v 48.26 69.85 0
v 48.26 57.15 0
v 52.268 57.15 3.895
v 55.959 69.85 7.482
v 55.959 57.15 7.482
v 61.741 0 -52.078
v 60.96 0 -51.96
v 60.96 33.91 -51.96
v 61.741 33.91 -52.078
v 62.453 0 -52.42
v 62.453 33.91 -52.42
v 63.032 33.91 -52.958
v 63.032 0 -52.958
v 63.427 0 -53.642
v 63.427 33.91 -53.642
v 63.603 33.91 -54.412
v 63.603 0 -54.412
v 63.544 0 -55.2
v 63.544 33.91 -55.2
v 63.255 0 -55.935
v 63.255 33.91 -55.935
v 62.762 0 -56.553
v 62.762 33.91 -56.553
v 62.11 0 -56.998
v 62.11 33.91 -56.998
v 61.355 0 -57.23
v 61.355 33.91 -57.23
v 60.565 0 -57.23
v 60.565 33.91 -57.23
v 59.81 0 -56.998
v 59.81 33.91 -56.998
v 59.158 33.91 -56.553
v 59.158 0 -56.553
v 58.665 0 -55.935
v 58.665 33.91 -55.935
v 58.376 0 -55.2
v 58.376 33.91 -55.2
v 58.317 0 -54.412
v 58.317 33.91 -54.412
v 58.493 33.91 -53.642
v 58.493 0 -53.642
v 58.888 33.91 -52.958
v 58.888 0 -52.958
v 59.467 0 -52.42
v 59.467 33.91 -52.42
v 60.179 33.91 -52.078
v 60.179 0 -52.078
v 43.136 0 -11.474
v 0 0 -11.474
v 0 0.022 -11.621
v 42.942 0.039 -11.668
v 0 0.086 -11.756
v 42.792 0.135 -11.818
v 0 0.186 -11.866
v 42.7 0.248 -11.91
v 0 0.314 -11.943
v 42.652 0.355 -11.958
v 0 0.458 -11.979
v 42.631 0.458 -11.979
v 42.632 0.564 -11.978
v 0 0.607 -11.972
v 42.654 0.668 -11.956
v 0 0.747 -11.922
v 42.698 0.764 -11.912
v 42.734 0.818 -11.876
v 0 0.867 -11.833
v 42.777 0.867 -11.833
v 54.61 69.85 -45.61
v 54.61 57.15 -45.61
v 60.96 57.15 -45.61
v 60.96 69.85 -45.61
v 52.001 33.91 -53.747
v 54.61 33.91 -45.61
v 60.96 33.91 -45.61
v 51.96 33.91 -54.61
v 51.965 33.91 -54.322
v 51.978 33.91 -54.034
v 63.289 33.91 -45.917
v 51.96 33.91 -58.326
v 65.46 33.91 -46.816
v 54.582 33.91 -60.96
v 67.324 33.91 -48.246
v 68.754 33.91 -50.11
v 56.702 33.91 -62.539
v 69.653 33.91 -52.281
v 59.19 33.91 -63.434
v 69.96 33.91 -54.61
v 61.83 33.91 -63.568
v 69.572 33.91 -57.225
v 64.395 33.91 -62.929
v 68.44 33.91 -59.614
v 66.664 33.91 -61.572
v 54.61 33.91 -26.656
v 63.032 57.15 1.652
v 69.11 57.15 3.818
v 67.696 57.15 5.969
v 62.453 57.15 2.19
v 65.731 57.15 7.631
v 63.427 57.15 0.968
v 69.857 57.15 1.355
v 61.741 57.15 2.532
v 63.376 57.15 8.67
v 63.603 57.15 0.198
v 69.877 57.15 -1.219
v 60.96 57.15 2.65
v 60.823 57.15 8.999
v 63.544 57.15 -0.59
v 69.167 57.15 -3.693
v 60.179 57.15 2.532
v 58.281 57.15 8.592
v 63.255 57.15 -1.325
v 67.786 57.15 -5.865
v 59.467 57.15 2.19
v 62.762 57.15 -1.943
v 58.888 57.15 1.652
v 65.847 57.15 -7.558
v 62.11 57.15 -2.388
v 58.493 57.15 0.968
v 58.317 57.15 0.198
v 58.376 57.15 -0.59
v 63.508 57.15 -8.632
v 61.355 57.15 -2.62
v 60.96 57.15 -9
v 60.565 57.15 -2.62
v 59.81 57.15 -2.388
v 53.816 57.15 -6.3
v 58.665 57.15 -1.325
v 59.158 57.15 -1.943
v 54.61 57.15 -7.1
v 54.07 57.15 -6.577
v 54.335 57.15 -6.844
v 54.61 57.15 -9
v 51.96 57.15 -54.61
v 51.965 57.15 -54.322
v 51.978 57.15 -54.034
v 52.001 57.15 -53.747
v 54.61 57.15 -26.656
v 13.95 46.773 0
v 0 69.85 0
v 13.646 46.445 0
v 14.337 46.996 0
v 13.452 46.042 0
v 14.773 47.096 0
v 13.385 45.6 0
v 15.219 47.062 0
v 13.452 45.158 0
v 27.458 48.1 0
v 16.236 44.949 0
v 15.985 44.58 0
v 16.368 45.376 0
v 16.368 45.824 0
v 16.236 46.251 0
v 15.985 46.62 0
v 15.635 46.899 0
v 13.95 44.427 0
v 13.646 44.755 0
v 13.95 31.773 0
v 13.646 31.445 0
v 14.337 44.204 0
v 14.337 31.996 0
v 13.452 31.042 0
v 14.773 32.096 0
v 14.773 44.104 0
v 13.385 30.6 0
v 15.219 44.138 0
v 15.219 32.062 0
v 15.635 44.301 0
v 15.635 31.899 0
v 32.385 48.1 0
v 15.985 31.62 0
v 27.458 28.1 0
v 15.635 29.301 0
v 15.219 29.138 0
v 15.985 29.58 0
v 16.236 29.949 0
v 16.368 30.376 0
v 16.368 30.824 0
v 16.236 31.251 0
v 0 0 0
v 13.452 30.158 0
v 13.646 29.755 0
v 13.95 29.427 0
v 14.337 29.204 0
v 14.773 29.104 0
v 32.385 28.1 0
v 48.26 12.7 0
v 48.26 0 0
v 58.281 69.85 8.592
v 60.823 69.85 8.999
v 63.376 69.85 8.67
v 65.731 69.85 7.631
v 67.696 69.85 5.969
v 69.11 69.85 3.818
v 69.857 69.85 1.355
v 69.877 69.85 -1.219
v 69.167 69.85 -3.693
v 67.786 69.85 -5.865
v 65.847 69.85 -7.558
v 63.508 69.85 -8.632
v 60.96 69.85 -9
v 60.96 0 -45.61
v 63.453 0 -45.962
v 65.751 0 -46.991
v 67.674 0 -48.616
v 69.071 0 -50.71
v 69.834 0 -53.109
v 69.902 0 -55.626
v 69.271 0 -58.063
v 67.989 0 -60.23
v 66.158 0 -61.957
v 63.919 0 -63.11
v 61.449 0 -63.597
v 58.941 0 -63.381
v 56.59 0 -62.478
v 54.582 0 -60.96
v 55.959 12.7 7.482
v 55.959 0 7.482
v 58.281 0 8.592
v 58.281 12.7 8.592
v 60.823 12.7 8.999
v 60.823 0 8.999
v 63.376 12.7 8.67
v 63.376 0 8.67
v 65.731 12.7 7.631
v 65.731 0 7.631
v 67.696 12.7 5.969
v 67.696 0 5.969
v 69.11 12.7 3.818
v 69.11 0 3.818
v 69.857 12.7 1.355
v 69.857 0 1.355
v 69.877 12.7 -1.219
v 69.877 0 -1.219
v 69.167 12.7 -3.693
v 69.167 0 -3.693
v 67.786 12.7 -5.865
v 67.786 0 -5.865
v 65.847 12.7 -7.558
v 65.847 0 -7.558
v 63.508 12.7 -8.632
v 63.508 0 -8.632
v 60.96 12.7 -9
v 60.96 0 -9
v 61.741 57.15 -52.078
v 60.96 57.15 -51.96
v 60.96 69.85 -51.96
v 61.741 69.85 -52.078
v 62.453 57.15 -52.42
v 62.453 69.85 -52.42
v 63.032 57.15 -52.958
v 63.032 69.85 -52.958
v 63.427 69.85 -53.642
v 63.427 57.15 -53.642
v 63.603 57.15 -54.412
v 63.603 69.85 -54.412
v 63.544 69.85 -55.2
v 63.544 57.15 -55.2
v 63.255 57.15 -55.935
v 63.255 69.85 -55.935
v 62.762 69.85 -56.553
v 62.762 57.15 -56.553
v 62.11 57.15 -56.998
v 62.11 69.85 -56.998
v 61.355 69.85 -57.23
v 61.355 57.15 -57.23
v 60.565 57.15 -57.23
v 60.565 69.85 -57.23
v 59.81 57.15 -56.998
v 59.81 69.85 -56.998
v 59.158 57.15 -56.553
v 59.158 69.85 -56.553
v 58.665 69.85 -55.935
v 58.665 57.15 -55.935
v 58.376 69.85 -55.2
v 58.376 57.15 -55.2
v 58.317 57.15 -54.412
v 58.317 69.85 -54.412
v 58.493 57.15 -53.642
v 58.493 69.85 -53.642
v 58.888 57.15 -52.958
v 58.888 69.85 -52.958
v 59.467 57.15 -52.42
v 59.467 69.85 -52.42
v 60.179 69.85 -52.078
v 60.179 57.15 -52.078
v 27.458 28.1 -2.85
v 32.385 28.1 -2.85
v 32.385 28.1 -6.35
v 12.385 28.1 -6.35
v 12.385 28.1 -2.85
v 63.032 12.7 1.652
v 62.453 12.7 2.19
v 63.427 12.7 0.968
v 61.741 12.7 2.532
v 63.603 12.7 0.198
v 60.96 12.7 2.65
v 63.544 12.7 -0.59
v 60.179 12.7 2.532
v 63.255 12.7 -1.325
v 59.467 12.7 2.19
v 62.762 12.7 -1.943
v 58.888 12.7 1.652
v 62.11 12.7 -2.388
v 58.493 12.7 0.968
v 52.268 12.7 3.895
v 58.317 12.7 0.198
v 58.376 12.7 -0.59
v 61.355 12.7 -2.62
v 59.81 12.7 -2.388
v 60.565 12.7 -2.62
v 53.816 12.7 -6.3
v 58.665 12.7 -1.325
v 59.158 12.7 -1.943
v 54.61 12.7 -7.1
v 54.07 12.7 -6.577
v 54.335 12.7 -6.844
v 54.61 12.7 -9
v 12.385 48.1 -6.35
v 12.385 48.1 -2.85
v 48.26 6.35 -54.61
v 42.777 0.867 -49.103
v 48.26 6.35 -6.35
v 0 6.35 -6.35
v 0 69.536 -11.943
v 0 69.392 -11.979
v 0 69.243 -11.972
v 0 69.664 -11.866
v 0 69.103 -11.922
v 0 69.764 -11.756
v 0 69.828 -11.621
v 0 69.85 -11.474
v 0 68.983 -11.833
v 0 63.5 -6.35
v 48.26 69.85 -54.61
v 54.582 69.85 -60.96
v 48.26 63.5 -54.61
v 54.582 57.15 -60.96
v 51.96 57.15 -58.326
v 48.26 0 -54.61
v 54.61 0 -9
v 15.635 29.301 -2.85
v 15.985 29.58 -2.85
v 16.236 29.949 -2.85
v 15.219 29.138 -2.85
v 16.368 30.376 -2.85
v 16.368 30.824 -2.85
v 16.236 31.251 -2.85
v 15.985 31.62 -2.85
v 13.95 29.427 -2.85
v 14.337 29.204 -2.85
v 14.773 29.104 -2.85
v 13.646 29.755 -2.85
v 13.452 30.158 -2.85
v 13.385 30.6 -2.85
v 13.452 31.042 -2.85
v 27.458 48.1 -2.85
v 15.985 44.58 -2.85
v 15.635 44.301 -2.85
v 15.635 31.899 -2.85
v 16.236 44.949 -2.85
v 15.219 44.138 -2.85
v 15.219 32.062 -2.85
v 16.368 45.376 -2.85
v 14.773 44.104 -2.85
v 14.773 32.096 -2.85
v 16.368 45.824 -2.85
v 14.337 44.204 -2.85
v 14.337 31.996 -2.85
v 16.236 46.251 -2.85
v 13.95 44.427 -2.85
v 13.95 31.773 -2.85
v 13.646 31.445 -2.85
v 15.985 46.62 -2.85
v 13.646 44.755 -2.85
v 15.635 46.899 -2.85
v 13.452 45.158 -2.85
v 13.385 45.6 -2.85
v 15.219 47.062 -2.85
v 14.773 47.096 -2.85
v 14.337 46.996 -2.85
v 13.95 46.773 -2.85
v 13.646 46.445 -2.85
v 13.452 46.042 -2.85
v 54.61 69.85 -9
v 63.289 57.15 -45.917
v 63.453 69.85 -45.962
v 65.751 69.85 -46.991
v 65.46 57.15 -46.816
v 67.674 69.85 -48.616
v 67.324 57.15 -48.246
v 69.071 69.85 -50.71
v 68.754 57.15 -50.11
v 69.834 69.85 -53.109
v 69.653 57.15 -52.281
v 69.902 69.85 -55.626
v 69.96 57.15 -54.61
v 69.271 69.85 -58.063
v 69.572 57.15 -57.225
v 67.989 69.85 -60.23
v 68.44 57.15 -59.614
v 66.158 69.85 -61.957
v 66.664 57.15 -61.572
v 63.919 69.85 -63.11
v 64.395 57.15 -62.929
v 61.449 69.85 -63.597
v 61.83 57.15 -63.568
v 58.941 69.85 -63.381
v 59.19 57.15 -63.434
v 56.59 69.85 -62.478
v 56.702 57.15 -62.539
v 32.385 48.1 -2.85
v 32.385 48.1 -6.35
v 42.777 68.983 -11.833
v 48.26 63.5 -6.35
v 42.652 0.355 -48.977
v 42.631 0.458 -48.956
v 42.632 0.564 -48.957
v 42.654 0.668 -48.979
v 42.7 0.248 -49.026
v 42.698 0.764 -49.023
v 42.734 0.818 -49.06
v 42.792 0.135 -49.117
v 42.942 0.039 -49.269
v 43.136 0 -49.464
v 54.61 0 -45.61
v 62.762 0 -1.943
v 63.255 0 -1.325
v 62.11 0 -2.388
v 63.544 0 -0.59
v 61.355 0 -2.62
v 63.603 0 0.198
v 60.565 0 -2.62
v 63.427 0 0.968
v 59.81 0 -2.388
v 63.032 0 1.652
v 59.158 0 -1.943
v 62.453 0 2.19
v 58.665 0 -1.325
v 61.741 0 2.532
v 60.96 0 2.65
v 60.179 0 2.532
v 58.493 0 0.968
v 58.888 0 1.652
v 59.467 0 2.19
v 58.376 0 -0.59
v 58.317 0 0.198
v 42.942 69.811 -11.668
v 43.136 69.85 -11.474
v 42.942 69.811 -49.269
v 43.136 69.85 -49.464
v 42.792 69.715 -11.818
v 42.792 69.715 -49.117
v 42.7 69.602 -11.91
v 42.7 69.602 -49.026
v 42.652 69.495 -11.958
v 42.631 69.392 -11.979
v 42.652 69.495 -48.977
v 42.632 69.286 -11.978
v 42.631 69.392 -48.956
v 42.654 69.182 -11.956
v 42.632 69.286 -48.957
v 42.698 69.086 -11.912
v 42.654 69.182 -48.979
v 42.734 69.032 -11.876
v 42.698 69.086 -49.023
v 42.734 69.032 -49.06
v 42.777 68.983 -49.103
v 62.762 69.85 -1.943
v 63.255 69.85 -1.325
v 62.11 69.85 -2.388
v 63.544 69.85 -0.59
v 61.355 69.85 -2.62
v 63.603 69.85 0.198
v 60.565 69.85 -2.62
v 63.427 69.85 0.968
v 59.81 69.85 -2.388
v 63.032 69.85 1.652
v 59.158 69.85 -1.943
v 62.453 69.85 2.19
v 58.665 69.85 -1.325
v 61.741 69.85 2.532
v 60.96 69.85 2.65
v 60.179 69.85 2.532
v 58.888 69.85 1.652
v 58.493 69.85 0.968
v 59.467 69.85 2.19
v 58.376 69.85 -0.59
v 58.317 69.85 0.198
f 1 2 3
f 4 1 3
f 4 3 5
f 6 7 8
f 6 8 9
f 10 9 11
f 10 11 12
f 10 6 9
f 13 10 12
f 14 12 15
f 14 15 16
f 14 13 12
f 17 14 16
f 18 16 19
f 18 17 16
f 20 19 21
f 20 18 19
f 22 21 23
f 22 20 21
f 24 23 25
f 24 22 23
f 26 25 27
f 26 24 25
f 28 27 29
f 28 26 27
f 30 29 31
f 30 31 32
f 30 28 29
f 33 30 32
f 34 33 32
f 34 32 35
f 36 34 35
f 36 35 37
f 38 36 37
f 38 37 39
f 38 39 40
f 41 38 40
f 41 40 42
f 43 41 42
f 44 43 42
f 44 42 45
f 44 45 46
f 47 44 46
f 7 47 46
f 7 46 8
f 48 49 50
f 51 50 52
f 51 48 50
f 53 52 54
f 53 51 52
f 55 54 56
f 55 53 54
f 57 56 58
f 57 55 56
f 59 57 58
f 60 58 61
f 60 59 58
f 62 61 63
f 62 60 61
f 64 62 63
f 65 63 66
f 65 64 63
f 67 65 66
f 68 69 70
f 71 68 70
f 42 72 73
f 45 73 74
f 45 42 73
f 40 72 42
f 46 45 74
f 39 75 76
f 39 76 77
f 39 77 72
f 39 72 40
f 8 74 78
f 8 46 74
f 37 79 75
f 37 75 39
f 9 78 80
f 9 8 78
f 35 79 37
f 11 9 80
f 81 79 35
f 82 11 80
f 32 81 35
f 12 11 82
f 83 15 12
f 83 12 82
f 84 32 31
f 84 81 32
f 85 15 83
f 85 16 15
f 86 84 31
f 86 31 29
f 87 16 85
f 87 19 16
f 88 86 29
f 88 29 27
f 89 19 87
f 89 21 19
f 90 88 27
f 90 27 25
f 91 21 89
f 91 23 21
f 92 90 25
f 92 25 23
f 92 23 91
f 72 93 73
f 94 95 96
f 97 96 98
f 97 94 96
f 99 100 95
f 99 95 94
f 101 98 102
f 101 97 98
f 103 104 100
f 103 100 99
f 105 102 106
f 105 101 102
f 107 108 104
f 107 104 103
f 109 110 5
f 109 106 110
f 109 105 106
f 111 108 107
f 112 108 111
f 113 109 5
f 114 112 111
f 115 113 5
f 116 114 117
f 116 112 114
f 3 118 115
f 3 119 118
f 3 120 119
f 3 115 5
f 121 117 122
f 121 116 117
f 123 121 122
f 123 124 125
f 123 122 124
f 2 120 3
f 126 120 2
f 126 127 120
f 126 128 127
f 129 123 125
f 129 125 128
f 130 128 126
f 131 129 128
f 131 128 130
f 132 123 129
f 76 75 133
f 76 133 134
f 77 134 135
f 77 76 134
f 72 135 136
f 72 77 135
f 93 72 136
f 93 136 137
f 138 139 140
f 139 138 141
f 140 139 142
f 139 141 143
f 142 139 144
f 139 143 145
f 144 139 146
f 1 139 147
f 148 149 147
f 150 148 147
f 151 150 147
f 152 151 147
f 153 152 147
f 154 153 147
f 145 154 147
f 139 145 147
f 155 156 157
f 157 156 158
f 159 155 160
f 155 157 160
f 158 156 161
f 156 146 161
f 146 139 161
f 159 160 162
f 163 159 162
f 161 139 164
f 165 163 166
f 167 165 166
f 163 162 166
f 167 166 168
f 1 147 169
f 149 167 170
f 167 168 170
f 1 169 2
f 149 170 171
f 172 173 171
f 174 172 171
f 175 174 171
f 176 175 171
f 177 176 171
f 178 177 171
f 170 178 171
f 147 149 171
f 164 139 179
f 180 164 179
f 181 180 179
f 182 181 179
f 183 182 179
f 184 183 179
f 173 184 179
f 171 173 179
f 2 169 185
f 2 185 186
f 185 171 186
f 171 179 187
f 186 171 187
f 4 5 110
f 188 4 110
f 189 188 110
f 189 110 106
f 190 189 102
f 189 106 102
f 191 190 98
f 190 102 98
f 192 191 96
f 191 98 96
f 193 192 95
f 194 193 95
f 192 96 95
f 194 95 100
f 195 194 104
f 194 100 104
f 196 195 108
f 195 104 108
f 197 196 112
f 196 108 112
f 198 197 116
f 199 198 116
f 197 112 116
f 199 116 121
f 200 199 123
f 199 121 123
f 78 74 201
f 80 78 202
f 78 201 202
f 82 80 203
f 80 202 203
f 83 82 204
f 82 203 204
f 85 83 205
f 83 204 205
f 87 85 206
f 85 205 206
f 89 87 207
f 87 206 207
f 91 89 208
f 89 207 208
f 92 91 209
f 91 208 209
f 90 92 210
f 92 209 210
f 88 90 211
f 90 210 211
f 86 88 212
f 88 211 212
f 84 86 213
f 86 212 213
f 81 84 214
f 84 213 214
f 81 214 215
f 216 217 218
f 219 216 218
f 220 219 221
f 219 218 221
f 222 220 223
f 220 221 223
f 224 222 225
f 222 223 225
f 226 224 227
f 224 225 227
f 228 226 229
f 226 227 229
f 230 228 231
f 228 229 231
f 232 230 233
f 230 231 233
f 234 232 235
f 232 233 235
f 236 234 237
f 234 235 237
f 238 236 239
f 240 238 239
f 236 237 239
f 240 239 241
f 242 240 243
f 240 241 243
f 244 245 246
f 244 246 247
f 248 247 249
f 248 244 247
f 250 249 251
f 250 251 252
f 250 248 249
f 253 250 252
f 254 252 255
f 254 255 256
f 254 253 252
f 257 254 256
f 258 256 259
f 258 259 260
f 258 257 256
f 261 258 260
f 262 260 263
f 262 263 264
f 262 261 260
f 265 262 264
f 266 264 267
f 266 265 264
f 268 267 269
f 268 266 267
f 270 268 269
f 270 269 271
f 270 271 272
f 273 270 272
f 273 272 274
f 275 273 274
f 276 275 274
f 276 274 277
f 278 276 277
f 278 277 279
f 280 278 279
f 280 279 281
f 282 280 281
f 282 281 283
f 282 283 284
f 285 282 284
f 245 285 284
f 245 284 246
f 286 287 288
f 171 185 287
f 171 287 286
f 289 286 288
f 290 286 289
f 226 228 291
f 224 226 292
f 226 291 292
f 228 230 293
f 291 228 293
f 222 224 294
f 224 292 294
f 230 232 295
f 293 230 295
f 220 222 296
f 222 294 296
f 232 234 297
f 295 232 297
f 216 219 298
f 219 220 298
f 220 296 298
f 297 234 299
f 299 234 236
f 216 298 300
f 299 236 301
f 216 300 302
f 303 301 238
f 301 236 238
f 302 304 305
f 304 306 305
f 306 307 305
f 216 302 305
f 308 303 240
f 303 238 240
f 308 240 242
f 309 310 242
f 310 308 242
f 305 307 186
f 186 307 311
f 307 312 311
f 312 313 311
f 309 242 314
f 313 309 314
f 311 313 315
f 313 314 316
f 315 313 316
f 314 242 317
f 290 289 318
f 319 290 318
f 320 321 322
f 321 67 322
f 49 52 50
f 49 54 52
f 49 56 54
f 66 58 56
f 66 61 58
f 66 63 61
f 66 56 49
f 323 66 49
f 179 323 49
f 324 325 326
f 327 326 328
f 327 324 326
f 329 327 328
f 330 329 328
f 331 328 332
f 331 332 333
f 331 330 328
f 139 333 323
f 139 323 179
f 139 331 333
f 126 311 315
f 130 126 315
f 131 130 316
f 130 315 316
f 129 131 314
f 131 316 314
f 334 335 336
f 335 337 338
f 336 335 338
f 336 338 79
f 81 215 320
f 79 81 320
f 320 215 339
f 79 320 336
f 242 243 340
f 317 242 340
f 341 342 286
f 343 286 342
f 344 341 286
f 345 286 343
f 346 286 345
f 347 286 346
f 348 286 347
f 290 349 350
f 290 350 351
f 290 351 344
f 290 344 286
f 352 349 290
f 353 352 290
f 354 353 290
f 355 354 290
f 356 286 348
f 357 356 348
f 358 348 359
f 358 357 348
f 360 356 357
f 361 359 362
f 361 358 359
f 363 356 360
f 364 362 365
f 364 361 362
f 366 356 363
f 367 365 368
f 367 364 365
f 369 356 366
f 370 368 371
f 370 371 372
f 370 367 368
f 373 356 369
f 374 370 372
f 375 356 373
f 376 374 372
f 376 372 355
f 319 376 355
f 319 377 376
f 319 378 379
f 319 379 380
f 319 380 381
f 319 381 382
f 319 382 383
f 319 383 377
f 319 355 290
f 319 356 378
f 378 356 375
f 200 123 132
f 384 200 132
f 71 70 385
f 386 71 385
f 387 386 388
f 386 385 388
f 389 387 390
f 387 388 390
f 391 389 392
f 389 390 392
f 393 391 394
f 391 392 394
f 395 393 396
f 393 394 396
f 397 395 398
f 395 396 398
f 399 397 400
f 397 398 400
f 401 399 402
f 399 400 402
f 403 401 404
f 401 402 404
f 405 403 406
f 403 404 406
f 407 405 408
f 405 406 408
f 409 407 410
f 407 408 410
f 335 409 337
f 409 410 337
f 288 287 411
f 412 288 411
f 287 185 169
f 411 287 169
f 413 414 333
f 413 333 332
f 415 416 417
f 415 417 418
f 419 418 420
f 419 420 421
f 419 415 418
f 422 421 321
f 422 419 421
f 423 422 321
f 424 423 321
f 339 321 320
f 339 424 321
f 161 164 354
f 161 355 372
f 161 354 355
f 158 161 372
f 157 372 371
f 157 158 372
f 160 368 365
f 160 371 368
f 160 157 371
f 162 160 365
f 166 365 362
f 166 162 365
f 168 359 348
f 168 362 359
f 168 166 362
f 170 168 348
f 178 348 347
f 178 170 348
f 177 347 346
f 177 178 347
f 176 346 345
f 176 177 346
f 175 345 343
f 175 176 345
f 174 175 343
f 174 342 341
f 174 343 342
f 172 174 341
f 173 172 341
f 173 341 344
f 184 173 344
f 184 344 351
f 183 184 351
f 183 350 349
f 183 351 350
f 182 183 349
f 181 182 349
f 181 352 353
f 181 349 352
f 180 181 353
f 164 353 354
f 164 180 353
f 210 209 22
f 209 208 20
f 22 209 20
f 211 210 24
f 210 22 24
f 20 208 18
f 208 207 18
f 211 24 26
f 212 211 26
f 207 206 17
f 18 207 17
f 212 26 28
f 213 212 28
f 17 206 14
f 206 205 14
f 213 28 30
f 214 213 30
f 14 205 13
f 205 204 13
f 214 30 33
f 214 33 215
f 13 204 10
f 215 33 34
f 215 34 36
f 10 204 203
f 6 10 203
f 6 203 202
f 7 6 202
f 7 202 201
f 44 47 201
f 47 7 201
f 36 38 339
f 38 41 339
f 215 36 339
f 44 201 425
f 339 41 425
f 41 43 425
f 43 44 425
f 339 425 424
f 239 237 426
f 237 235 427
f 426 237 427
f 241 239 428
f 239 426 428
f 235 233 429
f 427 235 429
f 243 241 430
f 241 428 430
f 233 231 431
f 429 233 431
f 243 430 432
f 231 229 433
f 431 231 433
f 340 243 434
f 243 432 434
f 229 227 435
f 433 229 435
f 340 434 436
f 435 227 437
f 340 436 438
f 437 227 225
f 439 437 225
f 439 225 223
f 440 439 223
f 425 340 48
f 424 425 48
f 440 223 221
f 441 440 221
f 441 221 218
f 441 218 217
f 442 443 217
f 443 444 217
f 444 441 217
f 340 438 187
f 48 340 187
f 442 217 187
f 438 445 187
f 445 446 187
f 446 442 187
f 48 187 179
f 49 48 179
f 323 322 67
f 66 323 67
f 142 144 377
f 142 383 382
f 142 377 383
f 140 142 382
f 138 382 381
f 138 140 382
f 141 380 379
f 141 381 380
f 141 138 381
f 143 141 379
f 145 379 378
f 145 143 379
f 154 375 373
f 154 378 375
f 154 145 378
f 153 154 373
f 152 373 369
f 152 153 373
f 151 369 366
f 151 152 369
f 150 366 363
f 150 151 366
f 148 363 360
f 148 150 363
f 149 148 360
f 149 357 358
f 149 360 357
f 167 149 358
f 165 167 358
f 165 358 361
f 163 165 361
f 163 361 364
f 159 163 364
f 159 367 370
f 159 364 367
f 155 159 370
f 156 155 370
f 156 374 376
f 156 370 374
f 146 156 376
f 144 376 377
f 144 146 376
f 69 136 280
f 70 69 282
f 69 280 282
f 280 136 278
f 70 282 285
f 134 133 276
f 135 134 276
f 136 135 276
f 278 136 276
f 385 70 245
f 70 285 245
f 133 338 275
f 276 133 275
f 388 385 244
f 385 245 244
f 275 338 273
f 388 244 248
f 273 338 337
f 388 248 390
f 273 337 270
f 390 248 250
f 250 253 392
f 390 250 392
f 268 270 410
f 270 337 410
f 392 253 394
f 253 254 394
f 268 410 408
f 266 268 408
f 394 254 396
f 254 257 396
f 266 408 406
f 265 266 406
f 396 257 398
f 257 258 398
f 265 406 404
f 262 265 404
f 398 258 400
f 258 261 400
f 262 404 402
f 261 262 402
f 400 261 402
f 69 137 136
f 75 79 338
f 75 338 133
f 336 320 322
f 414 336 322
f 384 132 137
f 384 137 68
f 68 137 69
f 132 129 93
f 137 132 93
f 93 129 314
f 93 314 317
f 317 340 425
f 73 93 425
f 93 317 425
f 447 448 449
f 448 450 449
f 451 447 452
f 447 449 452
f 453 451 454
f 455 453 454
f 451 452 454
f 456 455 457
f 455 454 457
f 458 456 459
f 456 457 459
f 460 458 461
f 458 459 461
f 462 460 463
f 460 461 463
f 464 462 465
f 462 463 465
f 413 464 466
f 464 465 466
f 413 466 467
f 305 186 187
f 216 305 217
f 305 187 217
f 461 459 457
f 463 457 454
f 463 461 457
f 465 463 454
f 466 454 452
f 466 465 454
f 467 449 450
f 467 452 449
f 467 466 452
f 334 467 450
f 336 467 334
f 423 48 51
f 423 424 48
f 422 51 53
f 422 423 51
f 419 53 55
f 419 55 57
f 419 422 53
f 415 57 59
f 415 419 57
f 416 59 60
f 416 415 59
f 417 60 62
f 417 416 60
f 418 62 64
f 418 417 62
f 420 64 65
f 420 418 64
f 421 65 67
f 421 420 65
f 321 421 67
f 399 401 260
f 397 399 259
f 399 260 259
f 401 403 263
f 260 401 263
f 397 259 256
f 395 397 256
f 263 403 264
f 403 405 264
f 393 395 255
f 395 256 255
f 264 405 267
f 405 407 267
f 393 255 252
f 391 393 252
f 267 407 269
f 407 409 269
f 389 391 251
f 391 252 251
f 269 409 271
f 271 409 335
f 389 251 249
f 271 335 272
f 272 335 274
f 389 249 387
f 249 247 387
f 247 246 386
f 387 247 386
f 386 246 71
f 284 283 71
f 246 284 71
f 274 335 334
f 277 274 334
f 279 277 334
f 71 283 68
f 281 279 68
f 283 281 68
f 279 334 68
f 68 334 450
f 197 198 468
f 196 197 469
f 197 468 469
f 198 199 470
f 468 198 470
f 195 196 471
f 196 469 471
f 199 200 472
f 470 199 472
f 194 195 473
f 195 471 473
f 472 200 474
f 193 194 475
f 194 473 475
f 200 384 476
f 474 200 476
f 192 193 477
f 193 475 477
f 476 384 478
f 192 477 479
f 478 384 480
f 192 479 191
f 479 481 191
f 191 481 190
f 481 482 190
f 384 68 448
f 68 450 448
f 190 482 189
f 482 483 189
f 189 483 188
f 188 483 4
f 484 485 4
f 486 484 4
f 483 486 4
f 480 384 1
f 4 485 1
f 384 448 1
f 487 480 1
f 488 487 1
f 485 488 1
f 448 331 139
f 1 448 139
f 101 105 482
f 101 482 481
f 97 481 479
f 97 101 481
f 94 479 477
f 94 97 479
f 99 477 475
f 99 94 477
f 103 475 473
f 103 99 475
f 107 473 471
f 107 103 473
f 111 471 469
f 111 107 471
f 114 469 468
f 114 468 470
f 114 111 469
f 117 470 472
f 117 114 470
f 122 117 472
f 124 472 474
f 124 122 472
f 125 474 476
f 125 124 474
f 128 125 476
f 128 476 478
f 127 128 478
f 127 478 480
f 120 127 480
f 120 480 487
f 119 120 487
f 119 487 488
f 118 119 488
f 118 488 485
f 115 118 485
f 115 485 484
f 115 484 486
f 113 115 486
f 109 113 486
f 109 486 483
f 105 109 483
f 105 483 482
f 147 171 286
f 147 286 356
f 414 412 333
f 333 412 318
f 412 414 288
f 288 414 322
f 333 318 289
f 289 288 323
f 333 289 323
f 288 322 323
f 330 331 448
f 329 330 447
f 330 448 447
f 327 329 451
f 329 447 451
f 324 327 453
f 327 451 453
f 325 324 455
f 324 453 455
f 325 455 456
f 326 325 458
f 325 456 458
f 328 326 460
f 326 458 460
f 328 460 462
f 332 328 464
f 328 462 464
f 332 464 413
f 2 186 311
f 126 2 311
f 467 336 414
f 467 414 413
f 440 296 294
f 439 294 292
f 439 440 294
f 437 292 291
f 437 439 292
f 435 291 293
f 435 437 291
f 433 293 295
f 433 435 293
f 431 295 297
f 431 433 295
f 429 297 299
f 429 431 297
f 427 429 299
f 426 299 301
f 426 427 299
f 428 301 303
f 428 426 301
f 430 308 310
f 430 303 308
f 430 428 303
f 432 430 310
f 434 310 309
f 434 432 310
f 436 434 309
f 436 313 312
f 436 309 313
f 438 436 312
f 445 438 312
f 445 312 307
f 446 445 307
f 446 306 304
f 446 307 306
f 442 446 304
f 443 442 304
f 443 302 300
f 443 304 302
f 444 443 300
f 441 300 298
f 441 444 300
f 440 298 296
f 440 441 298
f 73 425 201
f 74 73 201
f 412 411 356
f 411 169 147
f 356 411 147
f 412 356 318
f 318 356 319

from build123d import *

# Parameters (mm, degrees)
SKETCH1_R               = 2.65
BOSS_EXTRUDE1_DEPTH     = 69.85
BOSS_EXTRUDE2_REACH     = 119.557
BOSS_EXTRUDE3_REACH     = 116.246
CUT_EXTRUDE3_START      = -35.94
SKETCH7_R               = 2.65
CUT_EXTRUDE3_DEPTH      = 23.24
CUT_EXTRUDE2_START      = -12.7
SKETCH6_R               = 2.65
CUT_EXTRUDE2_DEPTH      = 44.45
FILLET1_R               = 0.508
SKETCH8_W               = 20
SKETCH8_H               = 20
CUT_EXTRUDE4_DEPTH      = 3.5
CUT_EXTRUDE6_DEPTH      = 117.039655722
CUT_EXTRUDE6_DEPTH_BACK = 117.039655722
SKETCH10_R              = 1.5
SKETCH10_W              = 4.926728391
SKETCH10_H              = 20


with BuildPart() as part:
    # Sketch1 → Boss-Extrude1 (new body)
    with BuildSketch(Plane(origin=(0, 0, 0), x_dir=(1, 0, 0), z_dir=(0, 1, 0))):
        with BuildLine():
            ThreePointArc((55.958719807, -7.48245925), (69.572262573, -2.613222795), (60.96, 9))
            Line((60.96, 9), (54.61, 9))
            Line((54.61, 9), (54.61, 45.61))
            Line((54.61, 45.61), (60.96, 45.61))
            ThreePointArc((60.96, 45.61), (69.27112045, 58.063299416), (54.582047244, 60.959938476))
            Line((54.582047244, 60.959938476), (48.26, 54.61))
            Line((48.26, 54.61), (48.26, 6.35))
            Line((48.26, 6.35), (0, 6.35))
            Line((0, 6.35), (0, 0))
            Line((0, 0), (48.26, 0))
            Line((48.26, 0), (55.958719807, -7.48245925))
        make_face()
        with Locations(Location((60.96, 0, 0), (0, 0, 270))):
            Circle(SKETCH1_R, mode=Mode.SUBTRACT)
        with Locations(Location((60.96, 54.61, 0), (0, 0, 270))):
            Circle(SKETCH1_R, mode=Mode.SUBTRACT)
    extrude(amount=BOSS_EXTRUDE1_DEPTH)

    # Sketch3 → Boss-Extrude2 (add, up to next)
    with BuildSketch(Plane.ZY, mode=Mode.PRIVATE) as boss_extrude2_sk1:
        Polygon((-6.35, 69.85), (-6.35, 63.5), (-12.7, 69.85), align=None)
    boss_extrude2_tool1 = extrude(boss_extrude2_sk1.sketch, amount=-BOSS_EXTRUDE2_REACH, mode=Mode.PRIVATE) - part.part
    # Sketch3 → Boss-Extrude2 (add, up to next)
    with BuildSketch(Plane.ZY, mode=Mode.PRIVATE) as boss_extrude2_sk2:
        Polygon((-6.35, 0), (-6.35, 6.35), (-12.7, 0), align=None)
    boss_extrude2_tool2 = extrude(boss_extrude2_sk2.sketch, amount=-BOSS_EXTRUDE2_REACH, mode=Mode.PRIVATE) - part.part
    add(boss_extrude2_tool1.solids().sort_by_distance((0, 67.733333, -8.466667))[0])
    add(boss_extrude2_tool2.solids().sort_by_distance((0, 2.116667, -8.466667))[0])

    # Boss-Extrude3: up to this plane
    boss_extrude3_end = Plane(origin=(-3.068514972, 69.85, -3.055036942), z_dir=(-0.7086614173228347, 0, -0.7055487195070168))
    # Sketch4 → Boss-Extrude3 (add, up to the surface)
    with BuildSketch(Plane(origin=(0, 0, -6.35), x_dir=(-1, 0, 0), z_dir=(0, 0, -1)), mode=Mode.PRIVATE) as boss_extrude3_sk1:
        Polygon((-48.26, 69.85), (-48.26, 63.5), (-41.91, 69.85), align=None)
    boss_extrude3_tool1 = split(extrude(boss_extrude3_sk1.sketch, amount=BOSS_EXTRUDE3_REACH, mode=Mode.PRIVATE), bisect_by=boss_extrude3_end, keep=Keep.BOTH, mode=Mode.PRIVATE)
    add(boss_extrude3_tool1.solids().sort_by_distance((46.143333, 67.733333, -6.35))[0])
    # Sketch4 → Boss-Extrude3 (add, up to the surface)
    with BuildSketch(Plane(origin=(0, 0, -6.35), x_dir=(-1, 0, 0), z_dir=(0, 0, -1)), mode=Mode.PRIVATE) as boss_extrude3_sk2:
        Polygon((-48.26, 6.35), (-48.26, 0), (-41.91, 0), align=None)
    boss_extrude3_tool2 = split(extrude(boss_extrude3_sk2.sketch, amount=BOSS_EXTRUDE3_REACH, mode=Mode.PRIVATE), bisect_by=boss_extrude3_end, keep=Keep.BOTH, mode=Mode.PRIVATE)
    add(boss_extrude3_tool2.solids().sort_by_distance((46.143333, 2.116667, -6.35))[0])

    # Sketch7 → Cut-Extrude3 (cut)
    # profile 1 of 4: a face of its own
    with BuildSketch(Plane(origin=(0, 69.85, 0), x_dir=(1, 0, 0), z_dir=(0, 1, 0)).offset(CUT_EXTRUDE3_START)):
        with BuildLine():
            ThreePointArc((52.001434215, 53.747388227), (52.824115031, 50.761964686), (54.61, 48.232108499))
            ThreePointArc((54.61, 48.232108499), (57.524961682, 46.291315503), (60.96, 45.61))
            ThreePointArc((60.96, 45.61), (67.323961031, 48.246038969), (69.96, 54.61))
            ThreePointArc((69.96, 54.61), (64.394998195, 62.928701065), (54.582047244, 60.959938476))
            ThreePointArc((54.582047244, 60.959938476), (52.641298935, 58.044998195), (51.96, 54.61))
            ThreePointArc((51.96, 54.61), (51.970364522, 54.178196843), (52.001434215, 53.747388227))
        make_face()
        with Locations(Location((60.96, 54.61, 0), (0, 0, 270))):
            Circle(SKETCH7_R, mode=Mode.SUBTRACT)
    # profile 2 of 4: a face of its own
    with BuildSketch(Plane(origin=(0, 69.85, 0), x_dir=(1, 0, 0), z_dir=(0, 1, 0)).offset(CUT_EXTRUDE3_START)):
        with BuildLine():
            Line((54.61, 48.232108499), (54.61, 45.61))
            Line((54.61, 45.61), (60.96, 45.61))
            ThreePointArc((60.96, 45.61), (57.524961682, 46.291315503), (54.61, 48.232108499))
        make_face()
    # profile 3 of 4: a face of its own
    with BuildSketch(Plane(origin=(0, 69.85, 0), x_dir=(1, 0, 0), z_dir=(0, 1, 0)).offset(CUT_EXTRUDE3_START)):
        with BuildLine():
            Line((51.96, 58.32632344), (51.96, 54.61))
            ThreePointArc((51.96, 54.61), (52.641298935, 58.044998195), (54.582047244, 60.959938476))
            Line((54.582047244, 60.959938476), (51.96, 58.32632344))
        make_face()
    # profile 4 of 4: a face of its own
    with BuildSketch(Plane(origin=(0, 69.85, 0), x_dir=(1, 0, 0), z_dir=(0, 1, 0)).offset(CUT_EXTRUDE3_START)):
        with BuildLine():
            Line((54.61, 26.656396737), (54.61, 45.61))
            Line((54.61, 45.61), (54.61, 48.232108499))
            ThreePointArc((54.61, 48.232108499), (52.824115031, 50.761964686), (52.001434215, 53.747388227))
            Line((52.001434215, 53.747388227), (54.61, 26.656396737))
        make_face()
    extrude(amount=CUT_EXTRUDE3_DEPTH, mode=Mode.SUBTRACT)

    # Sketch6 → Cut-Extrude2 (cut)
    # profile 1 of 7: a face of its own
    with BuildSketch(Plane(origin=(0, 0, 0), x_dir=(-1, 0, 0), z_dir=(0, -1, 0)).offset(CUT_EXTRUDE2_START)):
        with BuildLine():
            Line((-60.96, 9), (-57.841406567, 9))
            ThreePointArc((-57.841406567, 9), (-69.785888373, -3.581803934), (-52.451441296, -4.281361207))
            ThreePointArc((-52.451441296, -4.281361207), (-52.357529126, -4.089391135), (-52.267947508, -3.895362431))
            Line((-52.267947508, -3.895362431), (-55.958719807, -7.48245925))
            ThreePointArc((-55.958719807, -7.48245925), (-69.572262573, -2.613222795), (-60.96, 9))
        make_face()
    # profile 2 of 7: a face of its own
    with BuildSketch(Plane(origin=(0, 0, 0), x_dir=(-1, 0, 0), z_dir=(0, -1, 0)).offset(CUT_EXTRUDE2_START)):
        with BuildLine():
            ThreePointArc((-53.816250004, 6.300195314), (-54.20129816, 6.711599991), (-54.61, 7.099515829))
            ThreePointArc((-54.61, 7.099515829), (-56.131281182, 8.210304475), (-57.841406567, 9))
            Line((-57.841406567, 9), (-60.96, 9))
            ThreePointArc((-60.96, 9), (-69.572262573, -2.613222795), (-55.958719807, -7.48245925))
            Line((-55.958719807, -7.48245925), (-52.267947508, -3.895362431))
            ThreePointArc((-52.267947508, -3.895362431), (-51.645564295, -1.991710949), (-51.435, 0))
            ThreePointArc((-51.435, 0), (-52.050178349, 3.367596048), (-53.816250004, 6.300195314))
        make_face()
        with Locations(Location((-60.96, 0, 0), (0, 0, 270))):
            Circle(SKETCH6_R, mode=Mode.SUBTRACT)
    # profile 3 of 7: a face of its own
    with BuildSketch(Plane(origin=(0, 0, 0), x_dir=(-1, 0, 0), z_dir=(0, -1, 0)).offset(CUT_EXTRUDE2_START)):
        with Locations(Location((-60.96, 0, 0), (0, 0, 270))):
            Circle(SKETCH6_R)
    # profile 4 of 7: a face of its own
    with BuildSketch(Plane(origin=(0, 0, 0), x_dir=(-1, 0, 0), z_dir=(0, -1, 0)).offset(CUT_EXTRUDE2_START)):
        with BuildLine():
            Line((-52.267947508, -3.895362431), (-48.26, 0))
            Line((-48.26, 0), (-51.435, 0))
            ThreePointArc((-51.435, 0), (-51.645564295, -1.991710949), (-52.267947508, -3.895362431))
        make_face()
    # profile 5 of 7: a face of its own
    with BuildSketch(Plane(origin=(0, 0, 0), x_dir=(-1, 0, 0), z_dir=(0, -1, 0)).offset(CUT_EXTRUDE2_START)):
        with BuildLine():
            ThreePointArc((-52.267947508, -3.895362431), (-52.357529126, -4.089391135), (-52.451441296, -4.281361207))
            Line((-52.451441296, -4.281361207), (-48.26, 0))
            Line((-48.26, 0), (-52.267947508, -3.895362431))
        make_face()
    # profile 6 of 7: a face of its own
    with BuildSketch(Plane(origin=(0, 0, 0), x_dir=(-1, 0, 0), z_dir=(0, -1, 0)).offset(CUT_EXTRUDE2_START)):
        with BuildLine():
            Line((-54.61, 7.099515829), (-54.61, 9))
            Line((-54.61, 9), (-57.841406567, 9))
            ThreePointArc((-57.841406567, 9), (-56.131281182, 8.210304475), (-54.61, 7.099515829))
        make_face()
    # profile 7 of 7: a face of its own
    with BuildSketch(Plane(origin=(0, 0, 0), x_dir=(-1, 0, 0), z_dir=(0, -1, 0)).offset(CUT_EXTRUDE2_START)):
        with BuildLine():
            Line((-48.26, 0), (-53.816250004, 6.300195314))
            ThreePointArc((-53.816250004, 6.300195314), (-52.050178349, 3.367596048), (-51.435, 0))
            Line((-51.435, 0), (-48.26, 0))
        make_face()
    extrude(amount=-CUT_EXTRUDE2_DEPTH, mode=Mode.SUBTRACT)

    # Fillet1
    fillet1_edges = [part.edges().sort_by_distance(p)[0] for p in [
        (20.955, 69.85, -12.7),
        (41.91, 69.85, -30.465992724),
        (20.955, 0, -12.7),
        (41.91, 0, -30.465992724),
    ]]
    fillet(fillet1_edges, radius=FILLET1_R)

    # Sketch8 → Cut-Extrude4 (cut)
    with BuildSketch(Plane(origin=(0, 0, -6.35), x_dir=(-1, 0, 0), z_dir=(0, 0, -1))):
        with Locations((-22.385, 38.1)):
            Rectangle(SKETCH8_W, SKETCH8_H)
    extrude(amount=-CUT_EXTRUDE4_DEPTH, mode=Mode.SUBTRACT)

    # Sketch10 → Cut-Extrude6 (cut, two sides: drawn at the far end of the back side and taken through both)
    with BuildSketch(Plane(origin=(0, 0, -2.85), x_dir=(-1, 0, 0), z_dir=(0, 0, -1)).offset(-CUT_EXTRUDE6_DEPTH_BACK)):
        with Locations((-14.885, 30.6)):
            Circle(SKETCH10_R)
        with Locations((-14.885, 45.6)):
            Circle(SKETCH10_R)
        with Locations((-29.921635805, 38.1)):
            Rectangle(SKETCH10_W, SKETCH10_H)
    extrude(amount=CUT_EXTRUDE6_DEPTH + CUT_EXTRUDE6_DEPTH_BACK, mode=Mode.SUBTRACT)


solid = part.part
